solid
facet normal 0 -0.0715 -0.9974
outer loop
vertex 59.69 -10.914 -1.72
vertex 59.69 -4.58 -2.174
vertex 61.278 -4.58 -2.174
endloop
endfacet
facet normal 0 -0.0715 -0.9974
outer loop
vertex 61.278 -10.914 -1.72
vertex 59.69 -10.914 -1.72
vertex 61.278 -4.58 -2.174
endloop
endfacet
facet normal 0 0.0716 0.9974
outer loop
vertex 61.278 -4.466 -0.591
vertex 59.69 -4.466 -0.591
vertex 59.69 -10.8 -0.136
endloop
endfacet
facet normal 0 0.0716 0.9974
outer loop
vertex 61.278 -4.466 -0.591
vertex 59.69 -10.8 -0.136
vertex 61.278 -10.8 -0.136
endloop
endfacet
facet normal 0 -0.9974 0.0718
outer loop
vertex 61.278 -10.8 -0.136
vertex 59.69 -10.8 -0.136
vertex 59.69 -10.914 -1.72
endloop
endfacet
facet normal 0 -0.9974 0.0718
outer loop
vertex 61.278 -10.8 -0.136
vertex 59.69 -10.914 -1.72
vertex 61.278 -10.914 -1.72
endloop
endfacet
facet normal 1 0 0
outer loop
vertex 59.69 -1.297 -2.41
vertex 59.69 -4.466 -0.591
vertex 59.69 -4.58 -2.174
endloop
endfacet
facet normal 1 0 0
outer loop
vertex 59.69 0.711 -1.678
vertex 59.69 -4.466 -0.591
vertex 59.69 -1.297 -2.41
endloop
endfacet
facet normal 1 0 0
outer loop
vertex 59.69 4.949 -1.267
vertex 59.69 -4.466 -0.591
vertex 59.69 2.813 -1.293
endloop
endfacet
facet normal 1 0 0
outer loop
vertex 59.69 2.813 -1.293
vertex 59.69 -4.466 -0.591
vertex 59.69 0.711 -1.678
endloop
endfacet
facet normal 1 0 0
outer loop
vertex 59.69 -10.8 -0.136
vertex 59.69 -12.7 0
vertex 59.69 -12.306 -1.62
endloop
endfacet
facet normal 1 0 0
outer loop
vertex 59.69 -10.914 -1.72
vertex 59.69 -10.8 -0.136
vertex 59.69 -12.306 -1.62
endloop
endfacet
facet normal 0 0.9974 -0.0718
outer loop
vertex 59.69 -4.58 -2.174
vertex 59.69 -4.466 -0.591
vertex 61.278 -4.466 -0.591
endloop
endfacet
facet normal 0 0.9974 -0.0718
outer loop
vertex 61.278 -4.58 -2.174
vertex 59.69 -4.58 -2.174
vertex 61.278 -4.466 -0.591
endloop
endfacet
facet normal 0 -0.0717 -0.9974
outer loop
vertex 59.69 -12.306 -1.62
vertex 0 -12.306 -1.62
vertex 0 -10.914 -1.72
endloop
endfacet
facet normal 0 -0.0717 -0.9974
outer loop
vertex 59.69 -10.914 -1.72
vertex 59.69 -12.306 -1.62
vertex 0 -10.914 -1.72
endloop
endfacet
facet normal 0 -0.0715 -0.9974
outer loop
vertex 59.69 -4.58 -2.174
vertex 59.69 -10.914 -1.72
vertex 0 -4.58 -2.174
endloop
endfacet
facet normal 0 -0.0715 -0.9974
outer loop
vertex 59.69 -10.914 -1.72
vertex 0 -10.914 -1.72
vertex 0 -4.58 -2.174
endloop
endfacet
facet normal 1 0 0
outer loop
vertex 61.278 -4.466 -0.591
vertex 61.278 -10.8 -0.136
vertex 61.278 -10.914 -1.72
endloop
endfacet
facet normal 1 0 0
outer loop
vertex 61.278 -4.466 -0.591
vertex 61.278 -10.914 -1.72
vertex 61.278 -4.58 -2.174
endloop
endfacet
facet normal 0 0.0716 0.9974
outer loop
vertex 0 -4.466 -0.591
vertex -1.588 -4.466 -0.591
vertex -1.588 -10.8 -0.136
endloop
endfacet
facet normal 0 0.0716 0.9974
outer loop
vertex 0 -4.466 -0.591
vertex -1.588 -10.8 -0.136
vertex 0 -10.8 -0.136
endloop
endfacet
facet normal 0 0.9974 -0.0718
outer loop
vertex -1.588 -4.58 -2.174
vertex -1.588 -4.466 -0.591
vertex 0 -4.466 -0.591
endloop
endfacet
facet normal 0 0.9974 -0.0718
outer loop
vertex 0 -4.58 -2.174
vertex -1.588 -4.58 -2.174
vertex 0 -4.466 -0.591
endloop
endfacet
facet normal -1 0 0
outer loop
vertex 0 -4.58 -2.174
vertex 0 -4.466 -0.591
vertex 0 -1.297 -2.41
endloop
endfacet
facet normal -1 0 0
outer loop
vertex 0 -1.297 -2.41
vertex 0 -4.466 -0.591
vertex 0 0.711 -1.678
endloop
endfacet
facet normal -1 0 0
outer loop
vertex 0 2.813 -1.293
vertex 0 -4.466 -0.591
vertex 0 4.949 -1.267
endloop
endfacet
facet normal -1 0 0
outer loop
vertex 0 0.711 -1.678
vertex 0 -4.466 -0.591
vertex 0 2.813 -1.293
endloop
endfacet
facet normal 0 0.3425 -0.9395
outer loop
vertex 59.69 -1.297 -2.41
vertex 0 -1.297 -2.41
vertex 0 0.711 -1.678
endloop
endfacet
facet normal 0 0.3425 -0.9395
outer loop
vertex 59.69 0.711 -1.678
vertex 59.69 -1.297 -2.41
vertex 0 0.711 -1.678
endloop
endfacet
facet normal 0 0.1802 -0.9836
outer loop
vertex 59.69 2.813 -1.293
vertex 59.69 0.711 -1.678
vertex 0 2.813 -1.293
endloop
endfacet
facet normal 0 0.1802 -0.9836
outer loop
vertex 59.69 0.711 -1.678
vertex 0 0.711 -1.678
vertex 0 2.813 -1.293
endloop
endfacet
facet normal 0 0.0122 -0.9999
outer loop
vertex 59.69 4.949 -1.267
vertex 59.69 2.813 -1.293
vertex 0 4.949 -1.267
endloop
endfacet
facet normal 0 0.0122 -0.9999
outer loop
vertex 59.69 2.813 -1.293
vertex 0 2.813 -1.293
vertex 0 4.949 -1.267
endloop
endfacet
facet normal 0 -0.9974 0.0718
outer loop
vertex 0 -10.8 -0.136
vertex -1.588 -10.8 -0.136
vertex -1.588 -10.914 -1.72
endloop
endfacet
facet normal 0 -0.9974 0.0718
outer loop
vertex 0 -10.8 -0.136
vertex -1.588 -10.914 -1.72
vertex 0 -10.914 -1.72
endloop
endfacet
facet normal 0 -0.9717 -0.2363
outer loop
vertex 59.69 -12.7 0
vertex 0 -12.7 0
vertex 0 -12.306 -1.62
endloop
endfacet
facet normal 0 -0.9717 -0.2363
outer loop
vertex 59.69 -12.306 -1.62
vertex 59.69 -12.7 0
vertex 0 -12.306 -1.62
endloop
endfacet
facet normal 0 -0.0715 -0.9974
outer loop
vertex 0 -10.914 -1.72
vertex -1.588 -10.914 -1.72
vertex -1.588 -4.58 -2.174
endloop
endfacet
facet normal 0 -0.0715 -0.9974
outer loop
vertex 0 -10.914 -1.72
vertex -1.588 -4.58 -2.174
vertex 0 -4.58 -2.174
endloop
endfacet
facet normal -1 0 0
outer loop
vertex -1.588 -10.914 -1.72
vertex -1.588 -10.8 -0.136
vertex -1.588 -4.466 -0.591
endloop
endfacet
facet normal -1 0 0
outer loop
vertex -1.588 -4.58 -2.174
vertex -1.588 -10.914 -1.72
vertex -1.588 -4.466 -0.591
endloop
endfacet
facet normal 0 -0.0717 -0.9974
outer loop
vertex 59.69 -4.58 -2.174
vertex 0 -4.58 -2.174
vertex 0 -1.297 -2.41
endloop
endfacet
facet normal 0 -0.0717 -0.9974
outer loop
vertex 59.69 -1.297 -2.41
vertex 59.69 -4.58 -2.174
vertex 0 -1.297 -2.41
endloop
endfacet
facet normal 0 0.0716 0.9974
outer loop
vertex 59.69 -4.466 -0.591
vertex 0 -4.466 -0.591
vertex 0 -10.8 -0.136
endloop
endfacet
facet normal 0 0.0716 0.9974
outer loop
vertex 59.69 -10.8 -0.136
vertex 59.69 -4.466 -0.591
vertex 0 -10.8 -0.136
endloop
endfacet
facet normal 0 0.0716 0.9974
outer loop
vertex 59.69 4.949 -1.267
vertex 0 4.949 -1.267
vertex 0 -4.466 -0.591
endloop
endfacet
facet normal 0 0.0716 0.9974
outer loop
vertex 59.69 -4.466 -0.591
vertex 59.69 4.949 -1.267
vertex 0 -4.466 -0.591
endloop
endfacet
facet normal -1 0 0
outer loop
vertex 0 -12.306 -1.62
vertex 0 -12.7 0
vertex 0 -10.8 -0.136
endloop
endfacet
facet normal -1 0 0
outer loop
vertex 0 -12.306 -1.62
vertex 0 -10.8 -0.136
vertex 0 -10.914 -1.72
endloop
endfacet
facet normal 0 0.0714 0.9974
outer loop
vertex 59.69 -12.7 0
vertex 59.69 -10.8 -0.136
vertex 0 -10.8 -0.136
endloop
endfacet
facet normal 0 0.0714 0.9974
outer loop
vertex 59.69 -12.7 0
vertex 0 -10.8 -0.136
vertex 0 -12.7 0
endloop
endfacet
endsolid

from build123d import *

# Parameters (mm, degrees)
BOSS_EXTRUDE1_DEPTH = 59.69
SKETCH2_W           = 1.5875
SKETCH2_H           = 6.35
BOSS_EXTRUDE2_DEPTH = 1.5875


with BuildPart() as part:
    # Sketch1 → Boss-Extrude1 (new body)
    with BuildSketch(Plane(origin=(0, 0, 0), x_dir=(0, 0, -1), z_dir=(1, 0, 0))):
        with BuildLine():
            Line((0.590873303, -4.466173809), (0.136355378, -10.799886264))
            Line((0.136355378, -10.799886264), (0, -12.7))
            Line((0, -12.7), (1.619880116, -12.30567041))
            Line((1.619880116, -12.30567041), (2.174301417, -4.579803291))
            Line((2.174301417, -4.579803291), (2.409882648, -1.296976159))
            ThreePointArc((2.409882648, -1.296976159), (1.441524141, 1.753522136), (1.266539623, 4.949244036))
            Line((1.266539623, 4.949244036), (0.590873303, -4.466173809))
        make_face()
    extrude(amount=BOSS_EXTRUDE1_DEPTH)

    # Sketch2 → Boss-Extrude2 (add)
    with BuildSketch(Plane(origin=(0, -0.065066628, -0.906704203), x_dir=(1, 0, 0), z_dir=(0, 0.07157762605528778, 0.9974350321942224))):
        with Locations((-0.79375, -7.587424909)):
            Rectangle(SKETCH2_W, SKETCH2_H)
        with Locations((60.48375, -7.587424909)):
            Rectangle(SKETCH2_W, SKETCH2_H)
    extrude(amount=-BOSS_EXTRUDE2_DEPTH)


solid = part.part
